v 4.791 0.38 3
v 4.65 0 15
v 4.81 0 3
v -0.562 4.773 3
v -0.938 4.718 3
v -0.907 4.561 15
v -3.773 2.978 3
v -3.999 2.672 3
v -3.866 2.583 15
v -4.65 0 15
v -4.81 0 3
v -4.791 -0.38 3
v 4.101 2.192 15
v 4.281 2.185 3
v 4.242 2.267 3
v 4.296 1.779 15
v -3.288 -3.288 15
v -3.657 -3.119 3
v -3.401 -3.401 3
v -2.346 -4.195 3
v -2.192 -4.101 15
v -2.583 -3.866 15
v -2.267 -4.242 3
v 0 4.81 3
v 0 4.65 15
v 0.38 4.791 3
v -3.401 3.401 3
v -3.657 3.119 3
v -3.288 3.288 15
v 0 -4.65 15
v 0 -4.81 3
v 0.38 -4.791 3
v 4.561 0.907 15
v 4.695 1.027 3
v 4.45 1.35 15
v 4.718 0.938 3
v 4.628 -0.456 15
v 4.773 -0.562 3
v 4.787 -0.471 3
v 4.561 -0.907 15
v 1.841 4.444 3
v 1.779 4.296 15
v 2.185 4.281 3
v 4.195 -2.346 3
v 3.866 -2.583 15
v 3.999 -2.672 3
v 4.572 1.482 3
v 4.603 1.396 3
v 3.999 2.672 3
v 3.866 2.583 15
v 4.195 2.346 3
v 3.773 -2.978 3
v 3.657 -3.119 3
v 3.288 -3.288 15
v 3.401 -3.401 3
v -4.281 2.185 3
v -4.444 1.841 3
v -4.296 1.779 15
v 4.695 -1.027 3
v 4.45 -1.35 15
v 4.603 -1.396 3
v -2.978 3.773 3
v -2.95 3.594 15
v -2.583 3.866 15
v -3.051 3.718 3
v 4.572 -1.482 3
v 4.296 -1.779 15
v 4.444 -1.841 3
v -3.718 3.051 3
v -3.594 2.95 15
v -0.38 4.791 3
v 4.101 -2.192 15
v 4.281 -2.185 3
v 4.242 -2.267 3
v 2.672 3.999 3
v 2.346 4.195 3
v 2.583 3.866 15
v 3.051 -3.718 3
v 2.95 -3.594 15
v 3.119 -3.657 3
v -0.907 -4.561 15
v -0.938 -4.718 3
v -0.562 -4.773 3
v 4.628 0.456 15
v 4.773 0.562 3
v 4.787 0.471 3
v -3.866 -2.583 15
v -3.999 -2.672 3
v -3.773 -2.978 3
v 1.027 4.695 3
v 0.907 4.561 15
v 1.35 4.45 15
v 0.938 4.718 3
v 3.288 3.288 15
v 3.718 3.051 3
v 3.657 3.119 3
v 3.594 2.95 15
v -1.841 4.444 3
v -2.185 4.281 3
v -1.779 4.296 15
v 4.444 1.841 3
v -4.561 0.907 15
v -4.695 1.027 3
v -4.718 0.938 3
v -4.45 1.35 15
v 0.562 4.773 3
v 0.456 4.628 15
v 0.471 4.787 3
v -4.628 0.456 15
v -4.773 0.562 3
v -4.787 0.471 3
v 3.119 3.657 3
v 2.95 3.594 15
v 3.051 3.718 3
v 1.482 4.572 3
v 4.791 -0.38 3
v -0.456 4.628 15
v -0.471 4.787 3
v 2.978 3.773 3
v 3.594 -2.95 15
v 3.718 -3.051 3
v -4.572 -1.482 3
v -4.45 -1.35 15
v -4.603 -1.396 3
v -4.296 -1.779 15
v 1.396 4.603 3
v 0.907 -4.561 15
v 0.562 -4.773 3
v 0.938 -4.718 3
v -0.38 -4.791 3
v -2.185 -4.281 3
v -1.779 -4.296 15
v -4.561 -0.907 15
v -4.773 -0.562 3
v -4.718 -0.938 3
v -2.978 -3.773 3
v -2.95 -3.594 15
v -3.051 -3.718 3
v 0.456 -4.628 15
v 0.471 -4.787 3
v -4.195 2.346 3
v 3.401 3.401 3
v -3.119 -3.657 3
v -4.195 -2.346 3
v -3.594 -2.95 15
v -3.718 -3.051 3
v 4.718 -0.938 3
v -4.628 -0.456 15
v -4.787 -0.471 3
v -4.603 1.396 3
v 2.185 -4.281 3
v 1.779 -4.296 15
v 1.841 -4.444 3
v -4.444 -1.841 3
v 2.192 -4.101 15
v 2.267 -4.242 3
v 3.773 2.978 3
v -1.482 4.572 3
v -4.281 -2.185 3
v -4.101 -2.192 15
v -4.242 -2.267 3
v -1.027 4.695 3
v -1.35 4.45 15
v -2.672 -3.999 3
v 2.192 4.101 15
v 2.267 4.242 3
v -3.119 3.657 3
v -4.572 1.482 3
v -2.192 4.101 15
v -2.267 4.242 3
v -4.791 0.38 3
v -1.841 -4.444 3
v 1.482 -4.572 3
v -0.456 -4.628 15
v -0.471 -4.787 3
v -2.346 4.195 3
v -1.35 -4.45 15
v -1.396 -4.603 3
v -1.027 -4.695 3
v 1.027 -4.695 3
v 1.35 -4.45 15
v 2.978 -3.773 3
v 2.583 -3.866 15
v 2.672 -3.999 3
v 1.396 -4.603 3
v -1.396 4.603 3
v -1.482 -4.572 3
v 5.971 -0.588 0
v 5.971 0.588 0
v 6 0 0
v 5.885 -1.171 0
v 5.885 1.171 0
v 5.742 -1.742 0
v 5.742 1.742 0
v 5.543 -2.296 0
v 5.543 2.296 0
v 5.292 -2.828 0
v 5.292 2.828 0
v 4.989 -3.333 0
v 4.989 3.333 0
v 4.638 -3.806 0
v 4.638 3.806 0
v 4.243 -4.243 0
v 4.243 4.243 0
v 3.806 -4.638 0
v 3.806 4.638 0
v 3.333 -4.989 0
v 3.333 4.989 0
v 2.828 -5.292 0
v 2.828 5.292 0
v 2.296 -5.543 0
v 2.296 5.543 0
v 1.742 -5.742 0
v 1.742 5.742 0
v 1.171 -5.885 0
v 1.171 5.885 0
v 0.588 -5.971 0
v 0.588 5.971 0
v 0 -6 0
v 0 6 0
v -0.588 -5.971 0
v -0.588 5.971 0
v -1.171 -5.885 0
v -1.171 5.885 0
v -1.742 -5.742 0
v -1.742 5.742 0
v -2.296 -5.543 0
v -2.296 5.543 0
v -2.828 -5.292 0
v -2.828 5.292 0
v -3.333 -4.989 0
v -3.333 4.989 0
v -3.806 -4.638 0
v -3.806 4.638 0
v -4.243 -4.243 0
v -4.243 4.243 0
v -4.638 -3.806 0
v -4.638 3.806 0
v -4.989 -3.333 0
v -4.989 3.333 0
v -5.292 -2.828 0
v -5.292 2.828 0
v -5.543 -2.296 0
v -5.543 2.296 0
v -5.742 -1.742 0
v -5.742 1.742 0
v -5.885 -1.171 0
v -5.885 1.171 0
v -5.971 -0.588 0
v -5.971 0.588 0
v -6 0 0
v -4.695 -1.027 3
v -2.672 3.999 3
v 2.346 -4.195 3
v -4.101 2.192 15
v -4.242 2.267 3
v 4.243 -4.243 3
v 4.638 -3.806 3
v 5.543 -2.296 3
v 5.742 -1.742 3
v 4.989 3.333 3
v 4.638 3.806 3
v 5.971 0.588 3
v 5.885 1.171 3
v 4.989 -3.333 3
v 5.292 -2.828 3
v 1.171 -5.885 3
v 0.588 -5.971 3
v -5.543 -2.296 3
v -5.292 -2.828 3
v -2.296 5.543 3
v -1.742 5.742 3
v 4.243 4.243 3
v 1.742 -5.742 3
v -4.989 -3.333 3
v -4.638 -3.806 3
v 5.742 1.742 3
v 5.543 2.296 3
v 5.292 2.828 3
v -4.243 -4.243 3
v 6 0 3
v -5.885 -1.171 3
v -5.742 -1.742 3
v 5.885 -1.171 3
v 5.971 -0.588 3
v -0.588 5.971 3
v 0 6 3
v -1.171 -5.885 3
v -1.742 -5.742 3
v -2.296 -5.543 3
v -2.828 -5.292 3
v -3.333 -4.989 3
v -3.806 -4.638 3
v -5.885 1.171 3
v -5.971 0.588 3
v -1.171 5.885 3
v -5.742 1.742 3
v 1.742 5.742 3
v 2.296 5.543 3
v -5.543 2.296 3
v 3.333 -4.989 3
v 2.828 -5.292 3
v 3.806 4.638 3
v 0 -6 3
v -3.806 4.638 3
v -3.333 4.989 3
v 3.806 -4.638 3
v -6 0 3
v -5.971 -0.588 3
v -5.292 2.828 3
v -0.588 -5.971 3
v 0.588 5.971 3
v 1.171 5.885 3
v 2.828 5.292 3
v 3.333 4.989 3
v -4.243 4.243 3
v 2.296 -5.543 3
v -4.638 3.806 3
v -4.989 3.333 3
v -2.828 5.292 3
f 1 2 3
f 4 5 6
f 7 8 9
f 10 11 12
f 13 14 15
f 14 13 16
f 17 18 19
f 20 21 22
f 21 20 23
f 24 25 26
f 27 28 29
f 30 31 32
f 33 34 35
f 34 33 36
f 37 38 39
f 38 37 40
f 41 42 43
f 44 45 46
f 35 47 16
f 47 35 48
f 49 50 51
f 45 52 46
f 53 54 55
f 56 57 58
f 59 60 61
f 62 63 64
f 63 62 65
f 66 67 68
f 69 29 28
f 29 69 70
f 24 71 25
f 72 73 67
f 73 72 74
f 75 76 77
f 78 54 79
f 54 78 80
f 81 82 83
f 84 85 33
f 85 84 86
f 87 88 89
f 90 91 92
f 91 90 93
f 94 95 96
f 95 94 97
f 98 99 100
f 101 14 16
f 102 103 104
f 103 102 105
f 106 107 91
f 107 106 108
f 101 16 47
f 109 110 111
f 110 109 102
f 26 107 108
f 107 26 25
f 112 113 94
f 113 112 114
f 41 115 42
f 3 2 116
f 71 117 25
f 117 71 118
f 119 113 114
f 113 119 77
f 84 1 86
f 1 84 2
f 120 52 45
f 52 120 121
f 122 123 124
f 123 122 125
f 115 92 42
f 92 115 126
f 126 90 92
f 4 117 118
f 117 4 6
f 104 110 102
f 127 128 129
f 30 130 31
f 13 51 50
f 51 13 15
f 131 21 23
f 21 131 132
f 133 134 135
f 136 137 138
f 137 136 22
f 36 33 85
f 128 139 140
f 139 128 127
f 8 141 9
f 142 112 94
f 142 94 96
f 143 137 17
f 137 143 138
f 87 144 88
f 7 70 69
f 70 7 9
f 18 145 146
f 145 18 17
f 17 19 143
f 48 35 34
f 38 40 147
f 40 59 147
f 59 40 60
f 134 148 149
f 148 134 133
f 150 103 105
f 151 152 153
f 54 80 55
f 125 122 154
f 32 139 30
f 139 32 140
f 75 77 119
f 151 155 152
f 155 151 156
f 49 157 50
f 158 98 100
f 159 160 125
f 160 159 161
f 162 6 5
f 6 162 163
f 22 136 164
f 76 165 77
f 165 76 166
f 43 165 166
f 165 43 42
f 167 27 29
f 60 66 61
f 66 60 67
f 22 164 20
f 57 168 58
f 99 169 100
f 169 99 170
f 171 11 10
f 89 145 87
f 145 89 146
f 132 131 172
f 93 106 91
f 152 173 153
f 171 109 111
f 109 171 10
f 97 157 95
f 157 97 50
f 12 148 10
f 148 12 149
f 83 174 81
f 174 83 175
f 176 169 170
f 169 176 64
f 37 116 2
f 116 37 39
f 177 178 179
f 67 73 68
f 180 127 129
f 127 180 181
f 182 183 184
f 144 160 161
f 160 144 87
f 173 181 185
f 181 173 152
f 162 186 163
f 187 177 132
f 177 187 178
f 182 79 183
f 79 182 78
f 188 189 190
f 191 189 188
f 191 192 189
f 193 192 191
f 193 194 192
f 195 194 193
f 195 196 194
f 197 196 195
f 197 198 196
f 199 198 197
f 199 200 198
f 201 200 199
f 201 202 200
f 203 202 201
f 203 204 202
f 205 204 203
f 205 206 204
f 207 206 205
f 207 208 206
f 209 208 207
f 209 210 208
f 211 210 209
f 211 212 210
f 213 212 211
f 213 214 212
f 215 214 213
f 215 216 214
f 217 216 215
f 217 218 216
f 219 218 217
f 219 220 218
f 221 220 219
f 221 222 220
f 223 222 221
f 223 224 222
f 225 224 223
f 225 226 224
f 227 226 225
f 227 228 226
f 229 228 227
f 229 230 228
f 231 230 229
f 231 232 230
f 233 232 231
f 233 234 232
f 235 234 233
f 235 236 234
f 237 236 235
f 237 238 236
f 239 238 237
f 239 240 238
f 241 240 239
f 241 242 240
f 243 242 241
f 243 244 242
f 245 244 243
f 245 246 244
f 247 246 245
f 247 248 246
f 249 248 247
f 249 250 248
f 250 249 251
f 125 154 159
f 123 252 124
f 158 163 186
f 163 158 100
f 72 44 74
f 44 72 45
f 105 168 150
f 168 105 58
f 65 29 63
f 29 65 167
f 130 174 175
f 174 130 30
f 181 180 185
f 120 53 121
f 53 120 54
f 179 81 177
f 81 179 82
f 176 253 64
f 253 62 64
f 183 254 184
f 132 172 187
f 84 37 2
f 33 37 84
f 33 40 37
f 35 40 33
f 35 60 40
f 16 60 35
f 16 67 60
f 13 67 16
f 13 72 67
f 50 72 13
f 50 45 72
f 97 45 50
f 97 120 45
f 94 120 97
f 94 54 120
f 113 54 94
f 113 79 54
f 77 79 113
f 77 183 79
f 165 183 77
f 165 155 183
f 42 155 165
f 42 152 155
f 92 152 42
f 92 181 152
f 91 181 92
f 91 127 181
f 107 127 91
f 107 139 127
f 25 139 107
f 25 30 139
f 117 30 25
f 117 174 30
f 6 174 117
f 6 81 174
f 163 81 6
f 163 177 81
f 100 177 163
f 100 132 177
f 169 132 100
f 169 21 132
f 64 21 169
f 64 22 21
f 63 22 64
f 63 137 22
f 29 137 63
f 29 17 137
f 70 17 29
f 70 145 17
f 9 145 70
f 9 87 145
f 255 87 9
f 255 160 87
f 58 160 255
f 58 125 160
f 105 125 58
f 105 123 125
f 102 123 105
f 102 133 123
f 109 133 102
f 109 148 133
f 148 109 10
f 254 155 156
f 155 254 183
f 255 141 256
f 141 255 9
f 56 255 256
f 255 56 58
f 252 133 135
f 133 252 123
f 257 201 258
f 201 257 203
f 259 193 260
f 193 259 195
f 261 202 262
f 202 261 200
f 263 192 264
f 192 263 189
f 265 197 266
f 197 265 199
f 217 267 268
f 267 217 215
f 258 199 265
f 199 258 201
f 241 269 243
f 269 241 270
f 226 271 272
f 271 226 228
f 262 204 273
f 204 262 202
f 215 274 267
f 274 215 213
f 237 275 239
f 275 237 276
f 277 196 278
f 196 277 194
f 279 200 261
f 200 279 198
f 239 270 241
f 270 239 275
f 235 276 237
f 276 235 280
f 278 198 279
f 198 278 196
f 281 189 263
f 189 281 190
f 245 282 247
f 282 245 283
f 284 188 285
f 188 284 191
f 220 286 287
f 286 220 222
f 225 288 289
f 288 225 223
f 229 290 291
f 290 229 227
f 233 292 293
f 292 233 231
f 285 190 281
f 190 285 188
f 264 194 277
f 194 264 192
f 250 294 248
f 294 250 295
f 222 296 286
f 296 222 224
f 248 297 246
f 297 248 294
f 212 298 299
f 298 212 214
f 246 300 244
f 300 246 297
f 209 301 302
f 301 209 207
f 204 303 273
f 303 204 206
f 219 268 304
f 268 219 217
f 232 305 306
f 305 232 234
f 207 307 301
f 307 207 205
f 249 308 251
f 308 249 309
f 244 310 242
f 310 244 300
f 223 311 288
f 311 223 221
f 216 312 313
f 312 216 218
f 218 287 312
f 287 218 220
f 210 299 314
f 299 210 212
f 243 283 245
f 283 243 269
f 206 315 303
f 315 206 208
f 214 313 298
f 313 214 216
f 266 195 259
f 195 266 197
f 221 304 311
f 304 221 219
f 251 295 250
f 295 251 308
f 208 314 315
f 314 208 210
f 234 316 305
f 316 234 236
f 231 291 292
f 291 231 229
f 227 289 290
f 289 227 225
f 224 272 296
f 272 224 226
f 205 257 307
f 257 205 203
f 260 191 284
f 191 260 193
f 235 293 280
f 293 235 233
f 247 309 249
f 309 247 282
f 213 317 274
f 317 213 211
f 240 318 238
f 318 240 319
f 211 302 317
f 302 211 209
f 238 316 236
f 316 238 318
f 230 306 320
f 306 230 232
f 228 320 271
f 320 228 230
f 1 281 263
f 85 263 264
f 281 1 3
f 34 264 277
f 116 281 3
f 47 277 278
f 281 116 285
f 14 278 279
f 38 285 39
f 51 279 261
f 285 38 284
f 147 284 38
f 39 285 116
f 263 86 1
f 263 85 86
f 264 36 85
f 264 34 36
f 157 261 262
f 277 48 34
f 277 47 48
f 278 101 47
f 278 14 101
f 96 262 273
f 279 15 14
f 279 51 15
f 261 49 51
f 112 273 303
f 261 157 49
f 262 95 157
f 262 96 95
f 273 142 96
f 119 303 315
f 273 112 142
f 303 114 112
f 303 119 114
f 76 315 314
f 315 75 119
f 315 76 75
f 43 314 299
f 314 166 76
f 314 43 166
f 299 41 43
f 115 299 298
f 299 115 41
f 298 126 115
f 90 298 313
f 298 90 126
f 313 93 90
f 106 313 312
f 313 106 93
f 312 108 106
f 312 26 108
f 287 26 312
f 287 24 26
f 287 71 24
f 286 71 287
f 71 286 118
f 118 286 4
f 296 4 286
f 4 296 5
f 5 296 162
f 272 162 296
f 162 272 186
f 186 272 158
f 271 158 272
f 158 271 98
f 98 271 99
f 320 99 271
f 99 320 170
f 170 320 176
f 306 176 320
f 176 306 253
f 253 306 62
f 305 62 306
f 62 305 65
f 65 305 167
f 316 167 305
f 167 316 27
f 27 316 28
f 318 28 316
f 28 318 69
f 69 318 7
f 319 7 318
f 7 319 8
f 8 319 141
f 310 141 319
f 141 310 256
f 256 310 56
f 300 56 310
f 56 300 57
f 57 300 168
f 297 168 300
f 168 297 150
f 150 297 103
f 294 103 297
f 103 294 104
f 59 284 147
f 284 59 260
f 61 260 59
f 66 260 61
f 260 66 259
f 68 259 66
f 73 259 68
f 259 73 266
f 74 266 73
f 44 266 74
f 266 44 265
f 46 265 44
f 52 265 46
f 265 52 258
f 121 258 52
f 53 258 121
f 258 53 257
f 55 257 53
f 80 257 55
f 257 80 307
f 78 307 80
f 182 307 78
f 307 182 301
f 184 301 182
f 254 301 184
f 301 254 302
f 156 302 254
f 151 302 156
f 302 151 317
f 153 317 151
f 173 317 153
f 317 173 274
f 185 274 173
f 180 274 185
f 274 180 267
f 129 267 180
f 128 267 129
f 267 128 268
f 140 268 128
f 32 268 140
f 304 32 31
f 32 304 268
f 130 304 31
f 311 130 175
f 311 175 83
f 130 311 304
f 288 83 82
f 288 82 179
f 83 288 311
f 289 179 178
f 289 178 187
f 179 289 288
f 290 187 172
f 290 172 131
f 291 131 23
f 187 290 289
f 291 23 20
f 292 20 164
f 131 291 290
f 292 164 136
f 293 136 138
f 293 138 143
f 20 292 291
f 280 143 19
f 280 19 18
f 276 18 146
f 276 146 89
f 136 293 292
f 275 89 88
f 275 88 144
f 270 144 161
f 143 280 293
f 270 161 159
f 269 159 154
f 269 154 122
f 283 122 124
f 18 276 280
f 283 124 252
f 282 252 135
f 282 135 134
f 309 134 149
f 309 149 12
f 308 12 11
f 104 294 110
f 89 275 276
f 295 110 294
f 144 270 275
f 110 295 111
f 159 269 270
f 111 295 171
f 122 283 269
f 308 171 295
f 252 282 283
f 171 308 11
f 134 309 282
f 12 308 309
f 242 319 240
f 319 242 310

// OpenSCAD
$fn = 64;

cylinder(d2 = 9.3, d1 = 9.7, h = 15);

cylinder(d = 12, h = 3);
